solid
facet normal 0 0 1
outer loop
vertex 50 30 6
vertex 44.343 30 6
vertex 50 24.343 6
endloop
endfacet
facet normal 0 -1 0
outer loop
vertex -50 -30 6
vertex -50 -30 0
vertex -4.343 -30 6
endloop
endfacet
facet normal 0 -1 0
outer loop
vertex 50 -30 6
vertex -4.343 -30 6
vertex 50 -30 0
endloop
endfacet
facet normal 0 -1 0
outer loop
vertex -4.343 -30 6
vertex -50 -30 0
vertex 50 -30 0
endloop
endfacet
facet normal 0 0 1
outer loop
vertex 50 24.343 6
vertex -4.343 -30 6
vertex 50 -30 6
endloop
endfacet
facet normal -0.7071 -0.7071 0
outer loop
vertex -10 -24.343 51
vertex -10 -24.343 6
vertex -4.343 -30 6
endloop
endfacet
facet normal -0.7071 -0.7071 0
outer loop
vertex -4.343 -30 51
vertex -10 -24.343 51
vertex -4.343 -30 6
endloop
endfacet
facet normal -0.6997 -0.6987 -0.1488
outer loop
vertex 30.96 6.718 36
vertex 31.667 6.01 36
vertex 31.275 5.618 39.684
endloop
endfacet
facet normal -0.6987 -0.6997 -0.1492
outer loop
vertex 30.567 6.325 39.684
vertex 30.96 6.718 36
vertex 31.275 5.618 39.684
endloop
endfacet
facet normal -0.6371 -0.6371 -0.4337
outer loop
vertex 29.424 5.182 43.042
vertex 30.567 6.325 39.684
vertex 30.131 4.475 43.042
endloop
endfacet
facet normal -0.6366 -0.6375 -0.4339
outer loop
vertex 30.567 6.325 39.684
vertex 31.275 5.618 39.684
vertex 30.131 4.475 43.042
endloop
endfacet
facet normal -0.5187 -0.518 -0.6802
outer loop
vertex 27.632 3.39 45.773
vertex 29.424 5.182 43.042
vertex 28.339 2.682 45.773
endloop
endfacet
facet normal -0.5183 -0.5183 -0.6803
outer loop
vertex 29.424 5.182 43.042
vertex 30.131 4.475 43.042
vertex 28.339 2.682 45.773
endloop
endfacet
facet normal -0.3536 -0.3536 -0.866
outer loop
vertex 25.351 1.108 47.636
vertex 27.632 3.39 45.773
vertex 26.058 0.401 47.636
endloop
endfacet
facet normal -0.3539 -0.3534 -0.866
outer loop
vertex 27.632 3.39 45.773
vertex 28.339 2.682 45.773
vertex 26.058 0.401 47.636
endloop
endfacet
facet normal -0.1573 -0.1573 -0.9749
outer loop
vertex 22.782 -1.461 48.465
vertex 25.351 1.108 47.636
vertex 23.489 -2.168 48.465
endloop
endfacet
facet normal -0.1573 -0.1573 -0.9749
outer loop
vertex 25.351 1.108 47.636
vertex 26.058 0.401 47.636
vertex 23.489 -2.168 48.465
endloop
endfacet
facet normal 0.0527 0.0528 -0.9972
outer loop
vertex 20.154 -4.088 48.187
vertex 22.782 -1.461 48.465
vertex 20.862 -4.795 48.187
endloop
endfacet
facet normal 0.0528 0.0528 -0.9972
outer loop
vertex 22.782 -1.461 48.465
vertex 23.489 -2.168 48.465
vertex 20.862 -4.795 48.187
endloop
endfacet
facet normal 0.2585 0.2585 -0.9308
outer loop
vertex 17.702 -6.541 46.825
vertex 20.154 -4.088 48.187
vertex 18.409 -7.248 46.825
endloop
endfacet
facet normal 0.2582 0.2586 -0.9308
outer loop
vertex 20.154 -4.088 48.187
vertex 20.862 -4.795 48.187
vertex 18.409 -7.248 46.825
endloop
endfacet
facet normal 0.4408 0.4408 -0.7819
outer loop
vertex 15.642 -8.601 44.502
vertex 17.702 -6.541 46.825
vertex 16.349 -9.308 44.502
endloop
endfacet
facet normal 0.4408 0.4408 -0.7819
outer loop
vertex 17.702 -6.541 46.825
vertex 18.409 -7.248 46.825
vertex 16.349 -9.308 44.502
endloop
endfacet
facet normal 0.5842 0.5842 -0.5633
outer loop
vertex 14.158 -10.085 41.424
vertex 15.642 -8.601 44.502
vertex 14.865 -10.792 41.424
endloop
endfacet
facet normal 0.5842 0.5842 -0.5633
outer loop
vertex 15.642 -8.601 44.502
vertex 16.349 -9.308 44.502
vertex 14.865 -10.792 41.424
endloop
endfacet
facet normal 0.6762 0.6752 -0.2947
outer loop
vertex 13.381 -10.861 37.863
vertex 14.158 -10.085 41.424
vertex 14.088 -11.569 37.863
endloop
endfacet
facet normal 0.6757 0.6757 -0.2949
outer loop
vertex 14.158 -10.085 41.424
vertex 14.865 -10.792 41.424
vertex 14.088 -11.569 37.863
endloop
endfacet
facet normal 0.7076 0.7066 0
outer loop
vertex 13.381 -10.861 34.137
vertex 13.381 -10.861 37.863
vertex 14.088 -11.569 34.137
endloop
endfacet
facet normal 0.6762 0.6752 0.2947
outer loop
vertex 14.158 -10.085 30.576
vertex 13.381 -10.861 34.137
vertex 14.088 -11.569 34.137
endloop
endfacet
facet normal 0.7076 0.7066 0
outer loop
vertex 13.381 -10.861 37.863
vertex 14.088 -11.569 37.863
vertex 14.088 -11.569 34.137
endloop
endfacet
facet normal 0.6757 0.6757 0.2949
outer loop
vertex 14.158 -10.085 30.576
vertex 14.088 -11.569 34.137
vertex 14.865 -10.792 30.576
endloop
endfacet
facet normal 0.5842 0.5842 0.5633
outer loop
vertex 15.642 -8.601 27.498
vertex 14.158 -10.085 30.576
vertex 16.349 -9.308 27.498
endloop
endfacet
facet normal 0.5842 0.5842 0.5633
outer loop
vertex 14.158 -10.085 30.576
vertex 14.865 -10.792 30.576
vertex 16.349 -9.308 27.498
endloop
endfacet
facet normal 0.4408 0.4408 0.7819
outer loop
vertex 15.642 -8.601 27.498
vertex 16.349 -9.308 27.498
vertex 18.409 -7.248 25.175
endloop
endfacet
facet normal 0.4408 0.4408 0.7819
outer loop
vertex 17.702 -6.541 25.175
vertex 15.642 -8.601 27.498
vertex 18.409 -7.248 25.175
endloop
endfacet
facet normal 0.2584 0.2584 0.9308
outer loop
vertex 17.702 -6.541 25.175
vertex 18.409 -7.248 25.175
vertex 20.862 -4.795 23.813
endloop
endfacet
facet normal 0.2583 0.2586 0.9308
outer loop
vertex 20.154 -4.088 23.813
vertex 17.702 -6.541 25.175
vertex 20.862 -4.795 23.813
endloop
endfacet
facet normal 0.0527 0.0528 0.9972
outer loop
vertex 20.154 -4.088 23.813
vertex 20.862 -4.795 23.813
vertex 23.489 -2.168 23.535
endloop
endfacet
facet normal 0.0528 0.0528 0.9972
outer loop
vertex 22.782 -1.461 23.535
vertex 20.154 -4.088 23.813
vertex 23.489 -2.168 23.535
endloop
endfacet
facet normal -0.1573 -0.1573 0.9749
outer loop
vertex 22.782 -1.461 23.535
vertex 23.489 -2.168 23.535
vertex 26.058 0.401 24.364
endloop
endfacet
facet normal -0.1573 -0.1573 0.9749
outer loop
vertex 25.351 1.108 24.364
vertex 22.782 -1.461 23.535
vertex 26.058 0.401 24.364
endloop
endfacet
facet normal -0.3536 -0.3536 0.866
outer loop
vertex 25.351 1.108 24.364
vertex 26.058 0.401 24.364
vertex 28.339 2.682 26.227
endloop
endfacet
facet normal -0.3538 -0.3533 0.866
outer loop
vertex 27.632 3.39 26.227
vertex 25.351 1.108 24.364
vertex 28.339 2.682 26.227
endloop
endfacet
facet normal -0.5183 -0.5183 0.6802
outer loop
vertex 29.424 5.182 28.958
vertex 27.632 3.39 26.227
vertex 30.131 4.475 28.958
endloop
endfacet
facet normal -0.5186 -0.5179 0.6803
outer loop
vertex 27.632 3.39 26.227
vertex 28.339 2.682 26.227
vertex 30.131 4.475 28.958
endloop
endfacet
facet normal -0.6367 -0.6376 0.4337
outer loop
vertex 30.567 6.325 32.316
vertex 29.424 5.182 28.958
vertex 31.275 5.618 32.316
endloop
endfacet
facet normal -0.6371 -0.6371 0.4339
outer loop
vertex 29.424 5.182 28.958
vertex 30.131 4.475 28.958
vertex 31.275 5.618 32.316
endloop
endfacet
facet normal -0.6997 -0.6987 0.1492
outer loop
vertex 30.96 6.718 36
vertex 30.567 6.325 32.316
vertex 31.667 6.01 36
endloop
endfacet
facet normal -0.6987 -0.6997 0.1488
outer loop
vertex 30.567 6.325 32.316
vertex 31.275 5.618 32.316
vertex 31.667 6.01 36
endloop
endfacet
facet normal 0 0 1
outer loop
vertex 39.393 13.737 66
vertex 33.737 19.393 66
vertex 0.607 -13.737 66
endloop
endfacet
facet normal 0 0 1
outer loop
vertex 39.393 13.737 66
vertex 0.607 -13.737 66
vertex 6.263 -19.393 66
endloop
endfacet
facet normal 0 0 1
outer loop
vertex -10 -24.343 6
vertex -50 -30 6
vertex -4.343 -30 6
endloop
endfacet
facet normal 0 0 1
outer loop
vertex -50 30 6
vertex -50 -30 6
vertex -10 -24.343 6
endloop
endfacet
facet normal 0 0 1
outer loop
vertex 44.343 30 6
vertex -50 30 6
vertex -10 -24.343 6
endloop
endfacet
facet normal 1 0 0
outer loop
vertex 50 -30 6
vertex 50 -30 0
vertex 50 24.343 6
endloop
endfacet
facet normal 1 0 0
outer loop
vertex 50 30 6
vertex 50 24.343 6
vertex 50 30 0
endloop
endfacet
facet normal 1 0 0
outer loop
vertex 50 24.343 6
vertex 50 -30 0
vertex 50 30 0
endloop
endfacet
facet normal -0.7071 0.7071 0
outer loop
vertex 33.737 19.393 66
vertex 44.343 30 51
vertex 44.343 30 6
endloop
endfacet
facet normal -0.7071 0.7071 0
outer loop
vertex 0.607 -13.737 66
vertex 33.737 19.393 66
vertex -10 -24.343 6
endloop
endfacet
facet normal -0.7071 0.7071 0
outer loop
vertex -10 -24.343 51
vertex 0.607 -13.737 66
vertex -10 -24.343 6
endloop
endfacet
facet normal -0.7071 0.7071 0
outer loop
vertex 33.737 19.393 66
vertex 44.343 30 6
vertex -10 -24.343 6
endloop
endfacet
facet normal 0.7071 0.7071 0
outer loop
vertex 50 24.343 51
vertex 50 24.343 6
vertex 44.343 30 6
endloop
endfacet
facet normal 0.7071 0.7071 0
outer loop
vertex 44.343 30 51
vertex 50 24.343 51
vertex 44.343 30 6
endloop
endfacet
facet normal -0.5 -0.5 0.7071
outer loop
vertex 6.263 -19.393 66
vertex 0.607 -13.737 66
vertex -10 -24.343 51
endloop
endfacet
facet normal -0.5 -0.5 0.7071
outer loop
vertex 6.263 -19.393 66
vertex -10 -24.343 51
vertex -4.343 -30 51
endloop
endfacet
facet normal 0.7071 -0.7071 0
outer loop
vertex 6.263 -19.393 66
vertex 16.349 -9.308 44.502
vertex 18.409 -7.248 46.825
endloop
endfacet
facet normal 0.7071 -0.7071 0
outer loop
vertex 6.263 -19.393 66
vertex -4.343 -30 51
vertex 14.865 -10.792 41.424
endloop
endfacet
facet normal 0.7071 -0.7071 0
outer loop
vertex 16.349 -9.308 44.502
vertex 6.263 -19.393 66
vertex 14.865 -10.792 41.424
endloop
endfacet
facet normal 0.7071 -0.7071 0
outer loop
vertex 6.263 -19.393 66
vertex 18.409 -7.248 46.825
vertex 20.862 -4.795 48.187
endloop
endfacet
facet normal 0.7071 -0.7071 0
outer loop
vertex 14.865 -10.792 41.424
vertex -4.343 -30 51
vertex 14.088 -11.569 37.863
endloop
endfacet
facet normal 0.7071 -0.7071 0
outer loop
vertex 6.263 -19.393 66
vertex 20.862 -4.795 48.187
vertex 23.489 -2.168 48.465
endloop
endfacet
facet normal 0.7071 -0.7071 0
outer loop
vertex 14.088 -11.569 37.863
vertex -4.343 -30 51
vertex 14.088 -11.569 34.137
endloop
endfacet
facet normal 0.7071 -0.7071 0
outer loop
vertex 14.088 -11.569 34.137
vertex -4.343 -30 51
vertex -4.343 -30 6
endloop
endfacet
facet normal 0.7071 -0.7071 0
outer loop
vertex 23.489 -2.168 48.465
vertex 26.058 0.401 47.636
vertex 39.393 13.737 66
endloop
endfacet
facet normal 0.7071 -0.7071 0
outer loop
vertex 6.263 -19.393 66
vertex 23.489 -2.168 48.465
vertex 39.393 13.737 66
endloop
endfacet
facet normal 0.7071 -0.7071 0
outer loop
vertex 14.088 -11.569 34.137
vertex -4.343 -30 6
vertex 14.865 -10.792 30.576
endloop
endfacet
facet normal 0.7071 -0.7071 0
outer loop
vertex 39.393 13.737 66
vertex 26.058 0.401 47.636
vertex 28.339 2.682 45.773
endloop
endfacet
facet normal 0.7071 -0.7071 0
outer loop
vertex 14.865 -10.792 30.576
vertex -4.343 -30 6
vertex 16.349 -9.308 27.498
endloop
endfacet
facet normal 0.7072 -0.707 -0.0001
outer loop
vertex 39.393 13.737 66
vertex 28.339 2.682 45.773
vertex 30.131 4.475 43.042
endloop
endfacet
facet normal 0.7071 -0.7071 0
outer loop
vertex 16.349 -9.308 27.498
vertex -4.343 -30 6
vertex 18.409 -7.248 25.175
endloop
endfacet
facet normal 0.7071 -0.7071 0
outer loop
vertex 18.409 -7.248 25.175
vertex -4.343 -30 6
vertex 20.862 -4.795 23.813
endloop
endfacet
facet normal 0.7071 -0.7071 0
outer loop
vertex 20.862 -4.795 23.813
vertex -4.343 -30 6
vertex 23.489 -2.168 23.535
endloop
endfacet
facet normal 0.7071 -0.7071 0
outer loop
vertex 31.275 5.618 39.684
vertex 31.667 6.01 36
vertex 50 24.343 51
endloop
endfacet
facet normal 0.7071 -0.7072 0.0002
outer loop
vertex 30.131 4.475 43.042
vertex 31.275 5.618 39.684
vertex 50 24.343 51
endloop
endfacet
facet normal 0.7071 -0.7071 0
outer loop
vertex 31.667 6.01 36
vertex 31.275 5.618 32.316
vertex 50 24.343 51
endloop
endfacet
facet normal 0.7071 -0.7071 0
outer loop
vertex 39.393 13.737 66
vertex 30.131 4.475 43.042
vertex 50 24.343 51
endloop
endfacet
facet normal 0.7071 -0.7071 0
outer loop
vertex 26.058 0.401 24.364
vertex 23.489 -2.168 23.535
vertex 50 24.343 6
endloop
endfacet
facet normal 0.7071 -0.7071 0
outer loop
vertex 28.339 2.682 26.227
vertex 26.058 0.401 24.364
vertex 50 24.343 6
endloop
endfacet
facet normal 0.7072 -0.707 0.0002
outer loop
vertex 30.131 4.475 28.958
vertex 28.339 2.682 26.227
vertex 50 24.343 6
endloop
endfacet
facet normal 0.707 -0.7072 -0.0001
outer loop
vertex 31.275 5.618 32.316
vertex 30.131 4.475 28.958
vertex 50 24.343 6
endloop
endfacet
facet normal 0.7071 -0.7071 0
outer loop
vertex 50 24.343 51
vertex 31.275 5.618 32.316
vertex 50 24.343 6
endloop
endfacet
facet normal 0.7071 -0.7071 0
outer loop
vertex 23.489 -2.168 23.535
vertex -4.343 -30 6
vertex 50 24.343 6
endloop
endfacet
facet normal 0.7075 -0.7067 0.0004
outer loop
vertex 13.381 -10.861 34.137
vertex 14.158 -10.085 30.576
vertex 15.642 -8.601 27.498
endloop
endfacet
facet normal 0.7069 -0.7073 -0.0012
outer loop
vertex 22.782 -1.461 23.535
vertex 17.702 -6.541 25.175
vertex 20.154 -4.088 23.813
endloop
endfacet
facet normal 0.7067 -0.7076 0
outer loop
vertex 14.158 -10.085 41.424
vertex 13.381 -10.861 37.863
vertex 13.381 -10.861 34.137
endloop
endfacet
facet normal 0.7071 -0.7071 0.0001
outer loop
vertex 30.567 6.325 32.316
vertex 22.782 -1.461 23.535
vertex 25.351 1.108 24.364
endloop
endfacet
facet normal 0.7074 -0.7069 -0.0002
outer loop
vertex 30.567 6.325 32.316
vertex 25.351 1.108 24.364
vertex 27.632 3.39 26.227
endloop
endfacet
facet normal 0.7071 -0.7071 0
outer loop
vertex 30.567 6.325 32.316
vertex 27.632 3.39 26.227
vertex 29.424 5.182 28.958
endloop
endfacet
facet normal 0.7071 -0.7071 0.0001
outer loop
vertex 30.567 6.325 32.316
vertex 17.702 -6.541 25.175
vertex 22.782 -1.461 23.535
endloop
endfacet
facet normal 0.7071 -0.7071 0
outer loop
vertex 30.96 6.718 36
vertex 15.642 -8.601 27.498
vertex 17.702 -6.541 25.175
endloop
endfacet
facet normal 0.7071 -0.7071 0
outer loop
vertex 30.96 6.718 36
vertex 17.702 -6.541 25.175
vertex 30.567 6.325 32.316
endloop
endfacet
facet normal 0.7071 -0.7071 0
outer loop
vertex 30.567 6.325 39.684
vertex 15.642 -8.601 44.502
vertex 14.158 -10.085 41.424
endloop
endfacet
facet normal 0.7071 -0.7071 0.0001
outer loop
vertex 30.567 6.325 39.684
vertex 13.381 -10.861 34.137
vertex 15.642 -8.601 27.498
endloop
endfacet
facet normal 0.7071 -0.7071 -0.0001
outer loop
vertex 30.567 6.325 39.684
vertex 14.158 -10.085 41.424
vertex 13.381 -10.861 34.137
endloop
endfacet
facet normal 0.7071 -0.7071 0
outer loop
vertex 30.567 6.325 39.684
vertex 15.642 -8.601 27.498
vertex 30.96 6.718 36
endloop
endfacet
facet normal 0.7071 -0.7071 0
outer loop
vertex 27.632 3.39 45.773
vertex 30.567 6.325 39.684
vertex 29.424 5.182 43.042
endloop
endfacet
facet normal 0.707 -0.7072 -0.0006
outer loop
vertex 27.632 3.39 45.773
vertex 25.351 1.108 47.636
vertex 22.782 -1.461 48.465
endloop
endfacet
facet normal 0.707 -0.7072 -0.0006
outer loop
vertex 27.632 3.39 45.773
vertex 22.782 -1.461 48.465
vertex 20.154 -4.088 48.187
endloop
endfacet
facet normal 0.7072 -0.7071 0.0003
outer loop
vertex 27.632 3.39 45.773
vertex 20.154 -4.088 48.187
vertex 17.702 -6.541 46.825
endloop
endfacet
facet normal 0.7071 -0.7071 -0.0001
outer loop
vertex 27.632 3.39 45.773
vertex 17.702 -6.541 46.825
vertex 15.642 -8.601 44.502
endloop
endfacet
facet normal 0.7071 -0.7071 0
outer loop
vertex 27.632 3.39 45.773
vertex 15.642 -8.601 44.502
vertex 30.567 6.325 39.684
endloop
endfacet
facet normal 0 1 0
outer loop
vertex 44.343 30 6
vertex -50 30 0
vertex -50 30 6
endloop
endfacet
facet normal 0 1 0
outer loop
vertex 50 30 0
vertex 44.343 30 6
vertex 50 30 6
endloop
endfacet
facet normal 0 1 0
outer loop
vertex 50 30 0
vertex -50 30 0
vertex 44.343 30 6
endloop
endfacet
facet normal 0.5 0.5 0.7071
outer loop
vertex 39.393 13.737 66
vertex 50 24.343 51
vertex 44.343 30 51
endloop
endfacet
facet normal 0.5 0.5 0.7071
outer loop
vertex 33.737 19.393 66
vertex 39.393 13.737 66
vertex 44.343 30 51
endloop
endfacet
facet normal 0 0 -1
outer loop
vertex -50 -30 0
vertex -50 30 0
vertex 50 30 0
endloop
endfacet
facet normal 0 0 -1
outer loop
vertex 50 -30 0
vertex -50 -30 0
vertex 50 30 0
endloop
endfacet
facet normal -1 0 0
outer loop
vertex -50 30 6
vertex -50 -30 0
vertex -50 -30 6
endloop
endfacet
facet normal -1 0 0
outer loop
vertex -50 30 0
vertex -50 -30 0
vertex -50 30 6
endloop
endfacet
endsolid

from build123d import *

# Parameters (mm, degrees)
F0_W     = 100
F0_H     = 60
F1_DEPTH = 6
F3_DEPTH = 60
F4_R     = 12.5
F5_DEPTH = 1
F6_SIZE  = 15


with BuildPart() as f1:
    # F0 (on Top) → F1 (new body)
    with BuildSketch(Plane.XY):
        Rectangle(F0_W, F0_H)
    extrude(amount=F1_DEPTH)

    # F2 (on face) → F3 (join)
    with BuildSketch(Plane.XY.offset(6)):
        Polygon((44.343146, 30), (-10, -24.343146), (-4.343146, -30), (50, 24.343146), align=None)
    extrude(amount=F3_DEPTH)

    # F4 (on face) → F5 (cut)
    with BuildSketch(Plane(origin=(12.828427, -12.828427, 0), x_dir=(0.707107, 0.707107, 0), z_dir=(0.707107, -0.707107, 0))):
        with Locations((14.142136, 36)):
            Circle(F4_R)
    extrude(amount=-F5_DEPTH, mode=Mode.SUBTRACT)

    # F6
    f6_edges = [f1.edges().sort_by_distance(p)[0] for p in [
        (-7.171573, -27.171573, 66),
        (47.171573, 27.171573, 66),
    ]]
    chamfer(f6_edges, length=F6_SIZE)


solid = f1.part
